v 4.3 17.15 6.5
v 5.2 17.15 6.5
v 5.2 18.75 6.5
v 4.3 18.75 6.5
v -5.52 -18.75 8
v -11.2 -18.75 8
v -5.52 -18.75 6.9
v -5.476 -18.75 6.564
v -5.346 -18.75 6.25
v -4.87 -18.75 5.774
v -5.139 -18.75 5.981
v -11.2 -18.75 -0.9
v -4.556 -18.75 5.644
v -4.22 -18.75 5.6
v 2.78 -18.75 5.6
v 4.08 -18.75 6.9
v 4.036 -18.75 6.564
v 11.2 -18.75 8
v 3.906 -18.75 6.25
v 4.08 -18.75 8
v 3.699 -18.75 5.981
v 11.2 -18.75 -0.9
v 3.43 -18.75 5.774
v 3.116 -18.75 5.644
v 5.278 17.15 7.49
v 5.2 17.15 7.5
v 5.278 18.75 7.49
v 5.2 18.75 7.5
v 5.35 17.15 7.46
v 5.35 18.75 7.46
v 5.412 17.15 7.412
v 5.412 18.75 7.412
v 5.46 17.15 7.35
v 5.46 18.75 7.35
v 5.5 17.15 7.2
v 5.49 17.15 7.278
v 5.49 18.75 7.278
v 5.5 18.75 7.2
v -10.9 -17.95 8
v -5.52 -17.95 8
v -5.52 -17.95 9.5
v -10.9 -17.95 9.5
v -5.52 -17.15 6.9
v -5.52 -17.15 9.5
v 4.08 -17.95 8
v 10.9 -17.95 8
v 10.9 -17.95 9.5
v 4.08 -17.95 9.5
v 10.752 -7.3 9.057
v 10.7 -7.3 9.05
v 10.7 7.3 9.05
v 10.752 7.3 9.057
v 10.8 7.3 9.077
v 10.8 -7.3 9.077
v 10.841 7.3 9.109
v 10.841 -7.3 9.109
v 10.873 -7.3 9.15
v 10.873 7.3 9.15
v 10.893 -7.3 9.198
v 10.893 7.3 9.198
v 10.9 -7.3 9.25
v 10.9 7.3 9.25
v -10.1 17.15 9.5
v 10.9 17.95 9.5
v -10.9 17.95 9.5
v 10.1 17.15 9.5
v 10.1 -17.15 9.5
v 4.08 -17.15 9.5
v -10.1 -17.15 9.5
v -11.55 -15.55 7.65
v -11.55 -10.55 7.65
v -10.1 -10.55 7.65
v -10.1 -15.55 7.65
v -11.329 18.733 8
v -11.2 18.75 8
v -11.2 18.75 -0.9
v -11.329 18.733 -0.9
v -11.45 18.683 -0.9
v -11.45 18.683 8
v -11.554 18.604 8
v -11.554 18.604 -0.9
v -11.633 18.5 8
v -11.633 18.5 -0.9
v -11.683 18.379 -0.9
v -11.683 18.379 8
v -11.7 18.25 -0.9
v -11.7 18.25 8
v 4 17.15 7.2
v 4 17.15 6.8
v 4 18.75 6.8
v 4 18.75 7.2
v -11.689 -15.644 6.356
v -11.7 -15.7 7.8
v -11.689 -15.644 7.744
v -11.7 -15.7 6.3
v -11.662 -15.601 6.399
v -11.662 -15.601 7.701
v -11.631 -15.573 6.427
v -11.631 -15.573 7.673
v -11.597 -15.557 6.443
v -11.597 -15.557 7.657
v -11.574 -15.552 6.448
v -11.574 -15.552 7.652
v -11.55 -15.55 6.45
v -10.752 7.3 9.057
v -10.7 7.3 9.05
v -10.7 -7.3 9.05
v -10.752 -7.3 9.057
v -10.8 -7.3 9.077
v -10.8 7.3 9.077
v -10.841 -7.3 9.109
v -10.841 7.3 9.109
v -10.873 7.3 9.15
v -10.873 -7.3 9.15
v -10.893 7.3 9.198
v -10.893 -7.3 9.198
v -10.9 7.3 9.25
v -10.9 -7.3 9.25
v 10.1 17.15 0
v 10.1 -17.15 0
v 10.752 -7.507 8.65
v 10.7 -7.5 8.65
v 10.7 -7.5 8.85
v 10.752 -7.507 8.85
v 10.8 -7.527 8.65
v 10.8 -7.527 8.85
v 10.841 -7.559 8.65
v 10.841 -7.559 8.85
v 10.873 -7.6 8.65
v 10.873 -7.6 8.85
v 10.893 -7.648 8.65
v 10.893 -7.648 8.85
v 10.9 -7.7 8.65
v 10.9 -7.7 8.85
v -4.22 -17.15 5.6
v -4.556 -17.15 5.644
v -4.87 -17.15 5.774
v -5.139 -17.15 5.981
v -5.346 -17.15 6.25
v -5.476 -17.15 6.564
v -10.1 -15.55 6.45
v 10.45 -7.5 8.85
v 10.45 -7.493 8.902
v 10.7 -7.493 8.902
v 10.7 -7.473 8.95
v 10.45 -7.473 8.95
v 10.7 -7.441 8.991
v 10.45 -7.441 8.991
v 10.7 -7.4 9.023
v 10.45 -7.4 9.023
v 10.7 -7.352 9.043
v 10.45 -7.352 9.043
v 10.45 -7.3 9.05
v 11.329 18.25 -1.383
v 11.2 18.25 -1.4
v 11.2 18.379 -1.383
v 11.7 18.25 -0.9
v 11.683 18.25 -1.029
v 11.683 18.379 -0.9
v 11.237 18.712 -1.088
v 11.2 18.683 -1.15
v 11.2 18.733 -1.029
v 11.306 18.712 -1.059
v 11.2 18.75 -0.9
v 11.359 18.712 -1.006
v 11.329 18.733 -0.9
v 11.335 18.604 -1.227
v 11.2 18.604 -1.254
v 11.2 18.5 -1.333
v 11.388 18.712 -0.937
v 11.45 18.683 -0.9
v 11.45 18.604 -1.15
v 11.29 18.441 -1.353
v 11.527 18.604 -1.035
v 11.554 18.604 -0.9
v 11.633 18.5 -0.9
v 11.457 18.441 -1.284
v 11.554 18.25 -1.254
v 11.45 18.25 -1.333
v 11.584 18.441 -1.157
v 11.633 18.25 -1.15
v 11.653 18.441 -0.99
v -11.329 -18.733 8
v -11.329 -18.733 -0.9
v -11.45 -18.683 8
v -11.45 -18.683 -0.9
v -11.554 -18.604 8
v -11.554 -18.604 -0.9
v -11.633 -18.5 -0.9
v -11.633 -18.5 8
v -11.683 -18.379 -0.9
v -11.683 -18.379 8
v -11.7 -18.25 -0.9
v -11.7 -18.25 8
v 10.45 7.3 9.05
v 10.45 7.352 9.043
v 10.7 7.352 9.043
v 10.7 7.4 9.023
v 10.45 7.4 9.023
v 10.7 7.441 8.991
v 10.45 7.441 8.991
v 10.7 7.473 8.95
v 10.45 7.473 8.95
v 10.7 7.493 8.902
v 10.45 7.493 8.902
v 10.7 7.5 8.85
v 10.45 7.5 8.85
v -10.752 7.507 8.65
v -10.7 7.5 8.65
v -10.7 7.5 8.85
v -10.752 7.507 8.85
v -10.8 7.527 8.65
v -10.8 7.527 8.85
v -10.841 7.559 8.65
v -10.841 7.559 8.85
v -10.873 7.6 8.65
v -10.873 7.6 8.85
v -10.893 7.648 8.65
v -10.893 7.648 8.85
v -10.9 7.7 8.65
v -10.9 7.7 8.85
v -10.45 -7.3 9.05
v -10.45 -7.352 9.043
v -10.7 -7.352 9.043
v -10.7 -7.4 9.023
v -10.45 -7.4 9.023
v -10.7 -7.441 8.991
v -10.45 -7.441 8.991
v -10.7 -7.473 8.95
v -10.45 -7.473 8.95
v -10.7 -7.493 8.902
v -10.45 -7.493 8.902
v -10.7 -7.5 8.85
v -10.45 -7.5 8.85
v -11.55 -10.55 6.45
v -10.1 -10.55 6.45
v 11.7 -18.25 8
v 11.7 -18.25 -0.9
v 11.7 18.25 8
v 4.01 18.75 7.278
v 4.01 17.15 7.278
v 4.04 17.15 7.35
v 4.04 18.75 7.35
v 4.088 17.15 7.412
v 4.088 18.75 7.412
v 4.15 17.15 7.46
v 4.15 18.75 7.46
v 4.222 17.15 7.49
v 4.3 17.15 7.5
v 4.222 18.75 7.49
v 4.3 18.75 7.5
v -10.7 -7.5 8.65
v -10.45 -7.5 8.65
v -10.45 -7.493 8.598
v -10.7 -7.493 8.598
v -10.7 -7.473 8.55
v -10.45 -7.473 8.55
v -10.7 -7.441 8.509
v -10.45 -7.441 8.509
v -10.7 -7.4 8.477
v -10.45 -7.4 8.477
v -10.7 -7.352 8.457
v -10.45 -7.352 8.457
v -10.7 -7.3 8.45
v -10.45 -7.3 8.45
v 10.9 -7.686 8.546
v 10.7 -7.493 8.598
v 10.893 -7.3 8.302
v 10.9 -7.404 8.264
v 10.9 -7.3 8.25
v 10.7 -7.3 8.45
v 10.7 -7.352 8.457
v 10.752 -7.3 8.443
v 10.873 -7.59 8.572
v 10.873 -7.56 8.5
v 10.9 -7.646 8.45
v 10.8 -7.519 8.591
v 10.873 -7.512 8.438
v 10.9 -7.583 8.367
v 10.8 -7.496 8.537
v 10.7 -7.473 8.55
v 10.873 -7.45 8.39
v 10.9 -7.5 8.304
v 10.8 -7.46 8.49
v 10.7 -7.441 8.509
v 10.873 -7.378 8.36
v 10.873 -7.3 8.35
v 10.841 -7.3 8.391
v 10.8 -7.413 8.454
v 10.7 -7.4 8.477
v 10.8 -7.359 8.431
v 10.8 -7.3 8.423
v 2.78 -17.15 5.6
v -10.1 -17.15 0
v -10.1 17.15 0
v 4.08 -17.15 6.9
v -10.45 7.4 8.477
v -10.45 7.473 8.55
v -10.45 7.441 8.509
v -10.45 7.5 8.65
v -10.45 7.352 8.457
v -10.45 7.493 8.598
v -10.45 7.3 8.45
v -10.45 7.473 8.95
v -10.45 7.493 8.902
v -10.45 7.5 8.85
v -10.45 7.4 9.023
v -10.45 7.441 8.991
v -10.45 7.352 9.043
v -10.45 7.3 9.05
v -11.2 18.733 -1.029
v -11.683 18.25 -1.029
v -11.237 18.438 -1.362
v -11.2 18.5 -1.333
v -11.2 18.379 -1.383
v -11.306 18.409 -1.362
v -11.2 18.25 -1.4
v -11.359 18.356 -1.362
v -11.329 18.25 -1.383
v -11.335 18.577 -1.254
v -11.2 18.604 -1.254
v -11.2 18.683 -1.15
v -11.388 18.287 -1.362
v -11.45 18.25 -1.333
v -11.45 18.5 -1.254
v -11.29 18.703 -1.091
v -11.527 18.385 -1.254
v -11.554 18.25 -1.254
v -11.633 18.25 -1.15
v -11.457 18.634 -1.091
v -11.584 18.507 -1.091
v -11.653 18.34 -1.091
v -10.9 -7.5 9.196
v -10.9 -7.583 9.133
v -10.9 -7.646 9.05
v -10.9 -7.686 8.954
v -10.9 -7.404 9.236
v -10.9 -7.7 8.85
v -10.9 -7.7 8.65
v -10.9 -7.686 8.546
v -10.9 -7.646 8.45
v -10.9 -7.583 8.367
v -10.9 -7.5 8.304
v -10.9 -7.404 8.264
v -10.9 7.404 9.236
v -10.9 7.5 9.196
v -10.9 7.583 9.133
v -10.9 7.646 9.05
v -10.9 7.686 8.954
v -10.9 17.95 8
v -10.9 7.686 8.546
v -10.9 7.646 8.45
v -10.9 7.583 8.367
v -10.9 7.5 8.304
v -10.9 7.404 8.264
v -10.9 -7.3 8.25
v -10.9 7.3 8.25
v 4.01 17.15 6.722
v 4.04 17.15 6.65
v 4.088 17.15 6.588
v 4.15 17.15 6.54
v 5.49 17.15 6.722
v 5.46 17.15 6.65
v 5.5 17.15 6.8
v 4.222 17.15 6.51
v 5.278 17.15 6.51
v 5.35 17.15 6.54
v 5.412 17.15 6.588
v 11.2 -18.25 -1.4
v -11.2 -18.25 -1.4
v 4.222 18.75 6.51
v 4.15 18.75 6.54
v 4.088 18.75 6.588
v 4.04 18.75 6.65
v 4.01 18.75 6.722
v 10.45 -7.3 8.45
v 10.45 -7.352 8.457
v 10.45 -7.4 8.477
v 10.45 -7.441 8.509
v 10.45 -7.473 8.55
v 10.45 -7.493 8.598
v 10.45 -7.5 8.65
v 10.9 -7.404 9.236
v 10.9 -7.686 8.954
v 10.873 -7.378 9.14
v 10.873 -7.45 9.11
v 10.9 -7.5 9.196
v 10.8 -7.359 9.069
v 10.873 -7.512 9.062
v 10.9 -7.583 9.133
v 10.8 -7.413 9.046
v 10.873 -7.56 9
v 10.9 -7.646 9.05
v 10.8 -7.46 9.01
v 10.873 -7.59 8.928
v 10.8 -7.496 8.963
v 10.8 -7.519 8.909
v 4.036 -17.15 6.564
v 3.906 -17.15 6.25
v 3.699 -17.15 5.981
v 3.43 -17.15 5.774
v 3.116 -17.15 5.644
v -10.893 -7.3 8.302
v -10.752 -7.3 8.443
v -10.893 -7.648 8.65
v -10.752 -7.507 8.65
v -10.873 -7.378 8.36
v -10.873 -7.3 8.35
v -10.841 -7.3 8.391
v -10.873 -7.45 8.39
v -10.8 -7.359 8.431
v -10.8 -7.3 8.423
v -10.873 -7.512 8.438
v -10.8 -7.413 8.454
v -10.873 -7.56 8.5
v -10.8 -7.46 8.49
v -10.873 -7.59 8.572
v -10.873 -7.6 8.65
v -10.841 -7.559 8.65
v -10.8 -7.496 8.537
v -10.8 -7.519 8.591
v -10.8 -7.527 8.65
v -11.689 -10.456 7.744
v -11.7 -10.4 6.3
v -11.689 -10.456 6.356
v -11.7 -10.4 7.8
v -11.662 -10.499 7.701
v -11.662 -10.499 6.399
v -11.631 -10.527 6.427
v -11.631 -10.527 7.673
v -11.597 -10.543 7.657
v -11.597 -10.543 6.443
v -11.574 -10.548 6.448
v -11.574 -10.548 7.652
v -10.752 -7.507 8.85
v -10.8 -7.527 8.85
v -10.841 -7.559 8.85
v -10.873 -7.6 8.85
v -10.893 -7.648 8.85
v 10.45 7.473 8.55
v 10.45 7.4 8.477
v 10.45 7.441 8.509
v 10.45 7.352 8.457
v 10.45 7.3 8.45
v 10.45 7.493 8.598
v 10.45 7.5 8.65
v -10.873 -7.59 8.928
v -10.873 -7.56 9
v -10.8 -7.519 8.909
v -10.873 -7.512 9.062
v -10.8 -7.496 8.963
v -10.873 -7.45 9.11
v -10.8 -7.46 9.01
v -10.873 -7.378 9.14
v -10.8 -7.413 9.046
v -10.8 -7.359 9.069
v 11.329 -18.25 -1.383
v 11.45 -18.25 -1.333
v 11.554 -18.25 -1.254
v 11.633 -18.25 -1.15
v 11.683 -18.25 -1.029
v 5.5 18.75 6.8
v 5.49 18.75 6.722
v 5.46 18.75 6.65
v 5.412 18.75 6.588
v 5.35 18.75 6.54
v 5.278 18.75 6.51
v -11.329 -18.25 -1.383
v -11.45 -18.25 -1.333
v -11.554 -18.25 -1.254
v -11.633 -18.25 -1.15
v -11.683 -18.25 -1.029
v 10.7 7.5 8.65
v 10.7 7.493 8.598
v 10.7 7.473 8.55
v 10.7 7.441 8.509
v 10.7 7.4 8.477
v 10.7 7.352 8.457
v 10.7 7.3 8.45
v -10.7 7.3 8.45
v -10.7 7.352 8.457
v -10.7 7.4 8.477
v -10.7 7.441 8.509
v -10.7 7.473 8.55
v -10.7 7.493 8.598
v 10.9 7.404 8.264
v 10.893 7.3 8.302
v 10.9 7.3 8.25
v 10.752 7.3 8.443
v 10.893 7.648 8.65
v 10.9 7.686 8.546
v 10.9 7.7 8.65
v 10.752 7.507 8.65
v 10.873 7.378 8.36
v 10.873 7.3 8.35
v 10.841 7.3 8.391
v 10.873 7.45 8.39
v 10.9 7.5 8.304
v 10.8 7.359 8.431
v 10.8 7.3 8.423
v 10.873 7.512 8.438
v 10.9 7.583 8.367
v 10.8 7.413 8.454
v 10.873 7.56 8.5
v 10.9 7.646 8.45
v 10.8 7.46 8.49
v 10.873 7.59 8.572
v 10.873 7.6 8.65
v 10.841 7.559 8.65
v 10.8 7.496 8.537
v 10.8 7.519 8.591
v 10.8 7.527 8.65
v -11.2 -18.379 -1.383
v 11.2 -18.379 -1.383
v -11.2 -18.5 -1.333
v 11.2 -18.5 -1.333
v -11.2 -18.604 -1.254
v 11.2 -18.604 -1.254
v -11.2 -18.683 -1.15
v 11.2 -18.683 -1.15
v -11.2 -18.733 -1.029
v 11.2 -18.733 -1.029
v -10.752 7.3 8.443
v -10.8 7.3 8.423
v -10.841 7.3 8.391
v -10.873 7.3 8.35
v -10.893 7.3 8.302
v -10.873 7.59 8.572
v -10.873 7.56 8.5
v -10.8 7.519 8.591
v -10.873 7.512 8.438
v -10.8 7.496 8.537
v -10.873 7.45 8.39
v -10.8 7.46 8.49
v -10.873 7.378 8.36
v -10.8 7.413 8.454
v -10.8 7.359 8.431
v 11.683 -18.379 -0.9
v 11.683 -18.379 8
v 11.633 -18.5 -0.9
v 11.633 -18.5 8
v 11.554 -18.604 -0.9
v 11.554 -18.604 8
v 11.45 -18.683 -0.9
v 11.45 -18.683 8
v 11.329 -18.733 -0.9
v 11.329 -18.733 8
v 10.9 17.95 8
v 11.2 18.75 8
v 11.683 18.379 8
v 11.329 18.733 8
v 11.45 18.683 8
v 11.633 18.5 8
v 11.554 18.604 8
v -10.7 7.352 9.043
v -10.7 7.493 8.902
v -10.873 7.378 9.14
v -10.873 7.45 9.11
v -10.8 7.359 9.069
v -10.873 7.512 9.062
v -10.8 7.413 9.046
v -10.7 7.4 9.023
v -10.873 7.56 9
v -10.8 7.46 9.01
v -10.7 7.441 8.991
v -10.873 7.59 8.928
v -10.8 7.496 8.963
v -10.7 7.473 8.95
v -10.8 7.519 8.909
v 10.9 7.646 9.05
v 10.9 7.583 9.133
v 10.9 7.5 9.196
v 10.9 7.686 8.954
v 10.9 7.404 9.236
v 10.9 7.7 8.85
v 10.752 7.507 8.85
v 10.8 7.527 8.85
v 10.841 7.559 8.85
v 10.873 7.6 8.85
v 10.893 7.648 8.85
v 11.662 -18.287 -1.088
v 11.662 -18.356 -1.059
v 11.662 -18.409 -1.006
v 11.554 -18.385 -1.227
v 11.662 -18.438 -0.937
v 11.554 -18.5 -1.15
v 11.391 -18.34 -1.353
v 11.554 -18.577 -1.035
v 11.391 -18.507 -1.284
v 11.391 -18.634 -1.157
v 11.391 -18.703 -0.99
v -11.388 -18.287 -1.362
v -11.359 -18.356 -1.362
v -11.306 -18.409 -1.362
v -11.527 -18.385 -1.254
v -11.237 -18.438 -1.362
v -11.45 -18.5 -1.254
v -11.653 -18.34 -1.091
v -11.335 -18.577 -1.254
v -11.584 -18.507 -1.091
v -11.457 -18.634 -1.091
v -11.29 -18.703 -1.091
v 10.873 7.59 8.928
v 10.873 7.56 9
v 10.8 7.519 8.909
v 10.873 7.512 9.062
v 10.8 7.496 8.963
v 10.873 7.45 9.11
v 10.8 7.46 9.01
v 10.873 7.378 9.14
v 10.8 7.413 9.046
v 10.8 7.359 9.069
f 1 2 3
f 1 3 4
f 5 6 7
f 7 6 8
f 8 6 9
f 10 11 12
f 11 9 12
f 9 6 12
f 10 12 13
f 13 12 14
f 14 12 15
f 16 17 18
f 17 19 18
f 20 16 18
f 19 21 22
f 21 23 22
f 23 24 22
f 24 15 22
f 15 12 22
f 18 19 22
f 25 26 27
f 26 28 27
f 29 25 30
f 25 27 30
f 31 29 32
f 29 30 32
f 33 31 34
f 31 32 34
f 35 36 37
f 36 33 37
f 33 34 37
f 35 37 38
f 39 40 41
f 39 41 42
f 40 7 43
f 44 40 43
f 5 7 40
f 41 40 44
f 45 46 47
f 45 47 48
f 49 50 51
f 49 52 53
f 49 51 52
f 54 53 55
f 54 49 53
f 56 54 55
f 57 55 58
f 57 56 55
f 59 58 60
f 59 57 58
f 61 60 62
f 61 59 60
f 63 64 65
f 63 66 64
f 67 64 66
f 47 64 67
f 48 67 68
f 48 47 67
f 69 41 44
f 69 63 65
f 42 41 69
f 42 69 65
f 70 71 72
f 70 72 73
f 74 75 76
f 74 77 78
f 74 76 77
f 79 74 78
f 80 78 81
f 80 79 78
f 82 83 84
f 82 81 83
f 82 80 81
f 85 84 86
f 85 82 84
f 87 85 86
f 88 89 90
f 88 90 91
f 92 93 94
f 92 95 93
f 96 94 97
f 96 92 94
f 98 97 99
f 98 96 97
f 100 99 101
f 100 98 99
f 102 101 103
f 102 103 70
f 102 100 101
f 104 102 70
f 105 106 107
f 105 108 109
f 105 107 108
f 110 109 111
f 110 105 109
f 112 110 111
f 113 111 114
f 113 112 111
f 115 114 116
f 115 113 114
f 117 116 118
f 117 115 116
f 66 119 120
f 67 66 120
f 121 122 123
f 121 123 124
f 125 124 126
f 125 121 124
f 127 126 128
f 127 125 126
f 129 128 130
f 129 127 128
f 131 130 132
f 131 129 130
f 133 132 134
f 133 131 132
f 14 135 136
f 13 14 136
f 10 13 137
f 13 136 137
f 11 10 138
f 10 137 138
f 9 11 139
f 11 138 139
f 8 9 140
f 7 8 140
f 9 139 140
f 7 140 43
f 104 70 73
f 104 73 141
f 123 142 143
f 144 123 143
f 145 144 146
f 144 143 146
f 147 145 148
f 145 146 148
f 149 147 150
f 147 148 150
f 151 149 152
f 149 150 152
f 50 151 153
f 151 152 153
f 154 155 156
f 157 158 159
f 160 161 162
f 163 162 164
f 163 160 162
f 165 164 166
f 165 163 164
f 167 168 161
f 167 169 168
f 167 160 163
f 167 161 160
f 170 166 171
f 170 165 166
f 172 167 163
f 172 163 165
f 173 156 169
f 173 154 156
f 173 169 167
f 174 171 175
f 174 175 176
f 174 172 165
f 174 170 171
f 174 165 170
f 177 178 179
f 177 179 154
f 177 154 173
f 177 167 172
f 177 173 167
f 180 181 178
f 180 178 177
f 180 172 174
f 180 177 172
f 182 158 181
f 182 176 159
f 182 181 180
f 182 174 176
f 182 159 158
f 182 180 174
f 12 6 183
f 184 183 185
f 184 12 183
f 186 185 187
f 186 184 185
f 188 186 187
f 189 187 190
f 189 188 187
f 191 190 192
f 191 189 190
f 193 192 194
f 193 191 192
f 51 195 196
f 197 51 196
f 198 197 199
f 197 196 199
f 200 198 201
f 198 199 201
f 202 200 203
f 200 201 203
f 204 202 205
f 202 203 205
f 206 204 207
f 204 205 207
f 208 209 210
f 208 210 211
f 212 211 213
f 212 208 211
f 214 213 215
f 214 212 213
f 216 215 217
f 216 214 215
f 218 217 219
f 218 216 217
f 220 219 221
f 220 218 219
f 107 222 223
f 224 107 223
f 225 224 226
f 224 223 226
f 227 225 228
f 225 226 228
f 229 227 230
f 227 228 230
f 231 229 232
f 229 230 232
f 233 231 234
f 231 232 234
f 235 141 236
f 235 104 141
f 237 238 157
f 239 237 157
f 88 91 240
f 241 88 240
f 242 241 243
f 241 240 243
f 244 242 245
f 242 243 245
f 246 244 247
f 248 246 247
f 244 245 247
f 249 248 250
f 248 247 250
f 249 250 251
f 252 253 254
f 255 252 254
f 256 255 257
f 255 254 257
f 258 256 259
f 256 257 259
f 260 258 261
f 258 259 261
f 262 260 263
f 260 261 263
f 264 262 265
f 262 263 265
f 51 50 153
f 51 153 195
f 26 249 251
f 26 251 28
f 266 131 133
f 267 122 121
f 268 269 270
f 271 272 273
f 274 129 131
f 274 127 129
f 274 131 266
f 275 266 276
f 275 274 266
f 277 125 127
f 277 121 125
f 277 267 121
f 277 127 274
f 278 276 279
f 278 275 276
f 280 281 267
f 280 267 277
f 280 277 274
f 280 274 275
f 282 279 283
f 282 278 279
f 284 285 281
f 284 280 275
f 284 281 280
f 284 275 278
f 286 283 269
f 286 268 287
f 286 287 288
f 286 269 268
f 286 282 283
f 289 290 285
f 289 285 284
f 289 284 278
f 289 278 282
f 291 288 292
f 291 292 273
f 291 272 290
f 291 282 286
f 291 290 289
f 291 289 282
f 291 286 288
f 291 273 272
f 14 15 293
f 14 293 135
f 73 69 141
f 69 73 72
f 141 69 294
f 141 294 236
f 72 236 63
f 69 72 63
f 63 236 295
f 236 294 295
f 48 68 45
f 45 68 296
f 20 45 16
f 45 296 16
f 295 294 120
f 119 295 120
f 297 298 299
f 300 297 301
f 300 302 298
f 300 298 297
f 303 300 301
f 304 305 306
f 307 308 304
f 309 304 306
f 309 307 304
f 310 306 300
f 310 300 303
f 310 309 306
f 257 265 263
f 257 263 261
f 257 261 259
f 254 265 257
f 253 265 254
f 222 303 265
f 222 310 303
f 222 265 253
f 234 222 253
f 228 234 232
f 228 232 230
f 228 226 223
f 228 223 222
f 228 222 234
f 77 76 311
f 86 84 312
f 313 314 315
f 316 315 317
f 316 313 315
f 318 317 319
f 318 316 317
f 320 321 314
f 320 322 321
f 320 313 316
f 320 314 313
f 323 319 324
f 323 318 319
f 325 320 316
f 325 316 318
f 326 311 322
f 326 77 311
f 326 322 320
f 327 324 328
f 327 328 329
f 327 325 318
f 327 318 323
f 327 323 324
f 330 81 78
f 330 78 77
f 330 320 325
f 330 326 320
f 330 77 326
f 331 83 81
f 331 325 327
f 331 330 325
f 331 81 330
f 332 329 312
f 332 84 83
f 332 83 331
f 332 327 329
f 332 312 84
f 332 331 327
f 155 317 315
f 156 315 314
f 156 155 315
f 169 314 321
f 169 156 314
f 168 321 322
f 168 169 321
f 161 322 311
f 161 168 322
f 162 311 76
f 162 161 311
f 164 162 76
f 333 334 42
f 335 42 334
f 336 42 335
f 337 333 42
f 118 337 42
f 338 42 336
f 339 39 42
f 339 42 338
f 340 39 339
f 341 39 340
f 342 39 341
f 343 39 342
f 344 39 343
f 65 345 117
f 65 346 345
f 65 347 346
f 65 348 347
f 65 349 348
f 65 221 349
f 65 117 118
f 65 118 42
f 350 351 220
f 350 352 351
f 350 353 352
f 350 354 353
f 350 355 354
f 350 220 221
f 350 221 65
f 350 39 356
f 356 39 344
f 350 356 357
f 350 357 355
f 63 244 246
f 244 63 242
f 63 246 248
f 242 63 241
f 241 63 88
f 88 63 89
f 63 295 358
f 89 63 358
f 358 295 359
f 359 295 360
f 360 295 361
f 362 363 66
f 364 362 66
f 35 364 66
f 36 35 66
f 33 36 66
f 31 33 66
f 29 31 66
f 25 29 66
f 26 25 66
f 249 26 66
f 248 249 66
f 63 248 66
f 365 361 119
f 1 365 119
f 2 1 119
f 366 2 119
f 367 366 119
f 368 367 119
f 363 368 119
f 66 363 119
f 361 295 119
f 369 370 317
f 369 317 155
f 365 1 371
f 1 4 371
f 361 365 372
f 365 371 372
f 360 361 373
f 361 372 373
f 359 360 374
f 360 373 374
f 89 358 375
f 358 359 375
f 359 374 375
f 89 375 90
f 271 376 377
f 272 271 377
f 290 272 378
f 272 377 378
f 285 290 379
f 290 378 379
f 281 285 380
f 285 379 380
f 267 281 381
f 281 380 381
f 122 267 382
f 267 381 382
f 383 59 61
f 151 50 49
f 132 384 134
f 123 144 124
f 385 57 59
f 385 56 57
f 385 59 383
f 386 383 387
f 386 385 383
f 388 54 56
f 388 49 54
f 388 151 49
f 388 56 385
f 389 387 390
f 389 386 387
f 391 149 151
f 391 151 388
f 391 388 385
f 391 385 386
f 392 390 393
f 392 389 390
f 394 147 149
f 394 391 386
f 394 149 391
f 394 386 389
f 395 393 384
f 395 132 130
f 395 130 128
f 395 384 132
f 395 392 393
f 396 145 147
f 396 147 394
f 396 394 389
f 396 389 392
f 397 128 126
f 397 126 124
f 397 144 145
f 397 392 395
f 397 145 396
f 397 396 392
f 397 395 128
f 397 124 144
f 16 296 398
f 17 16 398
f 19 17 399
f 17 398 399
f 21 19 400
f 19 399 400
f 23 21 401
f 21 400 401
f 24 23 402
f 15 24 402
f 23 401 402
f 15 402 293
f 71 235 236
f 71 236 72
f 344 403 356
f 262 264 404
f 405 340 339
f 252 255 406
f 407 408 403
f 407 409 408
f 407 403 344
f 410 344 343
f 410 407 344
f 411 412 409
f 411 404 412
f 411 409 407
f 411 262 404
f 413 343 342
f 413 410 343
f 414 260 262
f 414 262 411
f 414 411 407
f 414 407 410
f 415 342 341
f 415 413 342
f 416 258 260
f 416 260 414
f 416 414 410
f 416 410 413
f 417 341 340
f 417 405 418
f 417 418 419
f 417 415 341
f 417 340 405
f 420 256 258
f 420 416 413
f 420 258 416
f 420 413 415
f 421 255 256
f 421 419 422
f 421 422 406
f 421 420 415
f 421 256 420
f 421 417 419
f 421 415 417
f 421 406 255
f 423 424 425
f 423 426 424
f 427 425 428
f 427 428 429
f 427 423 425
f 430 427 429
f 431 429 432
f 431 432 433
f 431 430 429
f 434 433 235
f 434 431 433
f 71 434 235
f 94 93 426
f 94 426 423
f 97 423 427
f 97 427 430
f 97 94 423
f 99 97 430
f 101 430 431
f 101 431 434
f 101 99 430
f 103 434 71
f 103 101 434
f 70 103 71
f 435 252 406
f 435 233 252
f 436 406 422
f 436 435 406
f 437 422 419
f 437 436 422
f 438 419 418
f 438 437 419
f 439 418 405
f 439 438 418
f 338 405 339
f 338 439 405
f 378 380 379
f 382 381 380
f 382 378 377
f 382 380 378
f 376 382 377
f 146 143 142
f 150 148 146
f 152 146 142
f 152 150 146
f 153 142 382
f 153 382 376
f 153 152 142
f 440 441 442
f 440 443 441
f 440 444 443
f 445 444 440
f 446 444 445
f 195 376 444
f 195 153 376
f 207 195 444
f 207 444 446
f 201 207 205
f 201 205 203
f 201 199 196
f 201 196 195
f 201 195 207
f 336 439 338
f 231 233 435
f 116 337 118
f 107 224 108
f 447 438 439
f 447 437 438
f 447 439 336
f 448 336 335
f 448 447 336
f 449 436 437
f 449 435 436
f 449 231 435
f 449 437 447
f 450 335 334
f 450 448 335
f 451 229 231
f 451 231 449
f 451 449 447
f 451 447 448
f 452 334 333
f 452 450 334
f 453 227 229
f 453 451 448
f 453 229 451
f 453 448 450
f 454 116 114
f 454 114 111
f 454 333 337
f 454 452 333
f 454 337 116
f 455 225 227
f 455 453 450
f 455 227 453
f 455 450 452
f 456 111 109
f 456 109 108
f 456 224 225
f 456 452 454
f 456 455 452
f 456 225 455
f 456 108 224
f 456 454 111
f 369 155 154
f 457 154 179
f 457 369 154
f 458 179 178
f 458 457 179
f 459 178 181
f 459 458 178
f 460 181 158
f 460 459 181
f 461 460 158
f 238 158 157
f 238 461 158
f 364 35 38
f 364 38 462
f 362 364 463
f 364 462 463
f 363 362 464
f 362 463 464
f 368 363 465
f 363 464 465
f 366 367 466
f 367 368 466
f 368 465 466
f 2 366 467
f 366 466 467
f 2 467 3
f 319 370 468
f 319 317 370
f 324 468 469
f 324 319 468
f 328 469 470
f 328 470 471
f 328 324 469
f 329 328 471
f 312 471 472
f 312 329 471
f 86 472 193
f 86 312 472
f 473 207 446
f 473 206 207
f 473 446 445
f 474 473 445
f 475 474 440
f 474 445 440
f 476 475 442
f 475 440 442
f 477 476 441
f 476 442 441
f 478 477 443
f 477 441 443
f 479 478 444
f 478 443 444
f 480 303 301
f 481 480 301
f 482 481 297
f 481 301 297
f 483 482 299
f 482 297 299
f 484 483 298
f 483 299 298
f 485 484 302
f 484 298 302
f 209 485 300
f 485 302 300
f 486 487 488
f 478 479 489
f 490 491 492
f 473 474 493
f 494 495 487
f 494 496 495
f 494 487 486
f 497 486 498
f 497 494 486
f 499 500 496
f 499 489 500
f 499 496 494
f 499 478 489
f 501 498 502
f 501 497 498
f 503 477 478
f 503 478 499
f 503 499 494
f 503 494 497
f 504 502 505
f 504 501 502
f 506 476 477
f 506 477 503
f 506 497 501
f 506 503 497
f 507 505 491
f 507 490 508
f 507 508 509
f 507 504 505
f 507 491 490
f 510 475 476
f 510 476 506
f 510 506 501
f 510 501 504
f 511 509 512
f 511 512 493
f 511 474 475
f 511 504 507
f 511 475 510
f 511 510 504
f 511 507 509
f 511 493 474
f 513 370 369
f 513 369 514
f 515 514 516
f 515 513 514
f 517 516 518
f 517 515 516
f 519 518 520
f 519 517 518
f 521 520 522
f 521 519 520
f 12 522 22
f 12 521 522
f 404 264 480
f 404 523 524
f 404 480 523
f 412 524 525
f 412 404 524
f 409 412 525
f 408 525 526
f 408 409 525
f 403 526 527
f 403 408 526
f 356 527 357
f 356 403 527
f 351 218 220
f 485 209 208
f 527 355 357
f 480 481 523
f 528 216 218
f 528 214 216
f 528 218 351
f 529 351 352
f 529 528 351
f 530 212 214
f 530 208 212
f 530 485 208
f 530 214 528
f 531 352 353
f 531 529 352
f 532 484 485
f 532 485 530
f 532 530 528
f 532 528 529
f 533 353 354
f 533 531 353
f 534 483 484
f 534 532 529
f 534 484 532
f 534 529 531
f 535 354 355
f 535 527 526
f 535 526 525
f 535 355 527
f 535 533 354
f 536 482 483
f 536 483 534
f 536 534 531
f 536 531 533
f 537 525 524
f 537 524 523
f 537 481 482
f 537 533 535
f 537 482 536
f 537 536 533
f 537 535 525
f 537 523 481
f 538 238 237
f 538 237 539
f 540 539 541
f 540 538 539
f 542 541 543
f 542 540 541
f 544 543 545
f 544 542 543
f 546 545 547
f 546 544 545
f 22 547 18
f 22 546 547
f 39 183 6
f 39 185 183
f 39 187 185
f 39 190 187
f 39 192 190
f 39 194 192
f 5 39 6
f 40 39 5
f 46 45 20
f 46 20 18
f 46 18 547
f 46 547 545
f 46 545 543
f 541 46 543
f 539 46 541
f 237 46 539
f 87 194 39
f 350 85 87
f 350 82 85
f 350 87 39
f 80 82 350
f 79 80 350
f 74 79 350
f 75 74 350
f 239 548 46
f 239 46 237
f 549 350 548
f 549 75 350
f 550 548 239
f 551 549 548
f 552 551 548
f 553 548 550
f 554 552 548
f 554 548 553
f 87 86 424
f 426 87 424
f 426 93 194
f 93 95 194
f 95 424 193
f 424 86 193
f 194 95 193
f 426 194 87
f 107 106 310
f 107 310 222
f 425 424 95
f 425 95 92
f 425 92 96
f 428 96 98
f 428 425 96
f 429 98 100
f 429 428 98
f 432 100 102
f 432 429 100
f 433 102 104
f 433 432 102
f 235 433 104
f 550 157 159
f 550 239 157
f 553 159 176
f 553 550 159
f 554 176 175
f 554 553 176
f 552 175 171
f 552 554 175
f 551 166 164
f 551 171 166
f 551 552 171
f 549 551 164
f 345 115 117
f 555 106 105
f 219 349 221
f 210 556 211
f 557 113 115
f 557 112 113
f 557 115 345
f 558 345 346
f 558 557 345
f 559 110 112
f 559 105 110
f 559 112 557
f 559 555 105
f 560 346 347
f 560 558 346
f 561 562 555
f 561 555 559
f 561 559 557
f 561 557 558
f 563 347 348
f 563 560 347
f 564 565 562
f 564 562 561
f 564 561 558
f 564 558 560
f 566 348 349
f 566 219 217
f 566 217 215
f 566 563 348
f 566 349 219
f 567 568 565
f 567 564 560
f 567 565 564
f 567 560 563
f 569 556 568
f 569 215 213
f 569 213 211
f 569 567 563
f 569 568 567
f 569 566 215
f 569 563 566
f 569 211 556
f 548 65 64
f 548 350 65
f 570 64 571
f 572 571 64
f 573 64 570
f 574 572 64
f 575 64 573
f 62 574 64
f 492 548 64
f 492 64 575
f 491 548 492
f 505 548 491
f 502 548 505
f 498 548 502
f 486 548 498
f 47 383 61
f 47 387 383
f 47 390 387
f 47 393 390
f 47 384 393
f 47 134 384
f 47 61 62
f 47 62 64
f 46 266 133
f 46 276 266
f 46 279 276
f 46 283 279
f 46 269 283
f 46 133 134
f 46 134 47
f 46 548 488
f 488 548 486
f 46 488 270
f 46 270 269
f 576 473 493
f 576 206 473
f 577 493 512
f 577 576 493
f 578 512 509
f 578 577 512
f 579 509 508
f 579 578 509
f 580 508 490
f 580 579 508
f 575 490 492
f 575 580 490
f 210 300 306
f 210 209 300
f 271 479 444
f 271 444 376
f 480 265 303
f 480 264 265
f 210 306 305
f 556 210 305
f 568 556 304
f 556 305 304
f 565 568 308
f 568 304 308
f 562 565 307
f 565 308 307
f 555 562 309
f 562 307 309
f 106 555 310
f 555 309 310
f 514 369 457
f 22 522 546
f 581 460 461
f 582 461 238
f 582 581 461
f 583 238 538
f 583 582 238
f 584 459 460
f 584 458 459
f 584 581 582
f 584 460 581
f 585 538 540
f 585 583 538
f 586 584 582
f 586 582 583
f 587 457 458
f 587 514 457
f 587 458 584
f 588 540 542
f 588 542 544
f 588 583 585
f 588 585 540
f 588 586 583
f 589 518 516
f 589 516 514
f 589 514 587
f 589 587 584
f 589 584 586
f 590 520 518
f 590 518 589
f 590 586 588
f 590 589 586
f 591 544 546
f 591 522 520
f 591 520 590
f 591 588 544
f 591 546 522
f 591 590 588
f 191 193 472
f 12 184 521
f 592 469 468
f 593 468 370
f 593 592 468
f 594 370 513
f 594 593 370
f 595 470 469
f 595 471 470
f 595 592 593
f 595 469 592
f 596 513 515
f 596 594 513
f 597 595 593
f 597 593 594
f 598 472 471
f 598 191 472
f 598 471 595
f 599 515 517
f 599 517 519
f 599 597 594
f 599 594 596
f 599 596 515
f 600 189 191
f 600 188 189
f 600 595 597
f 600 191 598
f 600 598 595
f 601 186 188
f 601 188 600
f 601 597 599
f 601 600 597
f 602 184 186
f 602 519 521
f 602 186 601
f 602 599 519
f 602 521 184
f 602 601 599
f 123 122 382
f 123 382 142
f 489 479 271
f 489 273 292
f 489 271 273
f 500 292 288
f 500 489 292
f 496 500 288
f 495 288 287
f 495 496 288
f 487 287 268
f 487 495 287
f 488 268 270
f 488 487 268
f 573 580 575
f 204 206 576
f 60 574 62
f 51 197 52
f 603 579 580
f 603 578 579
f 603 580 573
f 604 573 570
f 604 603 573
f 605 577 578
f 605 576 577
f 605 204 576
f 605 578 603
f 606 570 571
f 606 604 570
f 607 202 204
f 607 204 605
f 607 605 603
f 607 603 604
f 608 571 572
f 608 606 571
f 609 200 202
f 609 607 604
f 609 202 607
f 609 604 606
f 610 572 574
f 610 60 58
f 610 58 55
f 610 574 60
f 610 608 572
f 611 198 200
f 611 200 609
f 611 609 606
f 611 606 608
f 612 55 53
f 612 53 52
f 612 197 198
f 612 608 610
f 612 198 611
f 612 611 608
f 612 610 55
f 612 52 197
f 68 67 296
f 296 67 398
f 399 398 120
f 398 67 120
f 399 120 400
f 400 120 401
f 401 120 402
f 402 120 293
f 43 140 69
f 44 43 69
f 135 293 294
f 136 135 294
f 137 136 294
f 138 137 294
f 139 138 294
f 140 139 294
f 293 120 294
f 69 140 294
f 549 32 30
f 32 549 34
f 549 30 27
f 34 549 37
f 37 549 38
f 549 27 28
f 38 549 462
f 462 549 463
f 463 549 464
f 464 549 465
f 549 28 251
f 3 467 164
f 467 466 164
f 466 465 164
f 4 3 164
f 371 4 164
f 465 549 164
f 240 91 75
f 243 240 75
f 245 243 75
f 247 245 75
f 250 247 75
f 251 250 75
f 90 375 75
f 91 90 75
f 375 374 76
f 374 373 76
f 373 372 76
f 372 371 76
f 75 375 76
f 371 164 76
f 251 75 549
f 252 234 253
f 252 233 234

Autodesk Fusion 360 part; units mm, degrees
sketch "Sketch1" plane through (0, 0, 0) normal (0, 0, 1) x (1, 0, 0)
  line L0 (10.1, -17.15) -> (-10.1, -17.15)
  line L1 (-10.1, -17.15) -> (-10.1, 17.15)
  line L2 (-10.1, 17.15) -> (10.1, 17.15)
  line L3 (10.1, 17.15) -> (10.1, -17.15)
  line L4 (10.1, -17.15) -> (-10.1, 17.15) construction
  line L5 (-10.1, -17.15) -> (10.1, 17.15) construction
  line L6 (11.7, 18.75) -> (-11.7, 18.75)
  line L7 (-11.7, 18.75) -> (-11.7, -18.75)
  line L8 (-11.7, -18.75) -> (11.7, -18.75)
  line L9 (11.7, -18.75) -> (11.7, 18.75)
  line L10 (11.7, 18.75) -> (-11.7, -18.75) construction
  line L11 (-11.7, 18.75) -> (11.7, -18.75) construction
  dimension "d1" = 20.2
  dimension "d2" = 34.3
  dimension "d4" = 1.6
  dimension "d5" = 1.6
extrude "Extrude1" add sketch "Sketch1" along normal blind 8
sketch "Sketch2" plane through (0, 0, 0) normal (0, 0, -1) x (1, 0, 0)
  line L0 (10.1, -17.15) -> (-10.1, -17.15)
  line L1 (-10.1, -17.15) -> (-10.1, 17.15)
  line L2 (-10.1, 17.15) -> (10.1, 17.15)
  line L3 (10.1, 17.15) -> (10.1, -17.15)
  line L4 (11.7, -18.75) -> (11.7, 18.75)
  line L5 (11.7, 18.75) -> (-11.7, 18.75)
  line L6 (-11.7, 18.75) -> (-11.7, -18.75)
  line L7 (-11.7, -18.75) -> (11.7, -18.75)
  line L8 (-11.7, 18.75) -> (11.7, 18.75)
  line L9 (11.7, 18.75) -> (11.7, -18.75)
  line L10 (11.7, -18.75) -> (-11.7, -18.75)
  line L11 (-11.7, -18.75) -> (-11.7, 18.75)
extrude "Extrude2" add sketch "Sketch2" along normal blind 1.4 contours L0 L1 L2 L3 | L4 L5 L6 L7 L8 L9 L10 L11
sketch "Sketch3" plane through (0, -18.75, 0) normal (0, -1, 0) x (1, 0, 0)
  line L0 (11.7, -1.4) -> (11.7, 8)
  line L1 (11.7, 8) -> (-11.7, 8)
  line L2 (-11.7, 8) -> (-11.7, -1.4)
  line L3 (-11.7, -1.4) -> (11.7, -1.4)
  line L4 (-5.52, 8) -> (4.08, 8)
  line L5 (4.08, 8) -> (4.08, 5.6)
  line L6 (4.08, 5.6) -> (-5.52, 5.6)
  line L7 (-5.52, 5.6) -> (-5.52, 8)
  dimension "d10" = 7
  dimension "d11" = 6.18
  dimension "d14" = 9.6
extrude "Extrude3" cut sketch "Sketch3" against normal up to surface (1.6 mm away) contours L1 L4 L5 L6 L7
fillet "Fillet1" radius 1.3 2 edges at (-5.52, -17.95, 5.6) (4.08, -17.95, 5.6)
sketch "Sketch4" plane through (-11.7, 0, 0) normal (-1, 0, 0) x (0, -1, 0)
  line L0 (18.75, -1.4) -> (18.75, 8)
  line L1 (18.75, 8) -> (-18.75, 8)
  line L2 (-18.75, 8) -> (-18.75, -1.4)
  line L3 (-18.75, -1.4) -> (18.75, -1.4)
  line L4 (10.55, 7.65) -> (15.55, 7.65)
  line L5 (15.55, 7.65) -> (15.55, 6.45)
  line L6 (15.55, 6.45) -> (10.55, 6.45)
  line L7 (10.55, 6.45) -> (10.55, 7.65)
  dimension "d17" = 3.2
  dimension "d18" = 5
  dimension "d19" = 1.2
  dimension "d22" = 0.35
extrude "Extrude4" cut sketch "Sketch4" against normal up to surface (1.6 mm away) contours L4 L5 L6 L7
fillet "Fillet2" radius 0.15 4 edges at (-11.7, -13.05, 6.45) (-11.7, -10.55, 7.05) (-11.7, -13.05, 7.65) (-11.7, -15.55, 7.05)
sketch "Sketch5" plane through (0, 0, 8) normal (0, 0, 1) x (-1, 0, 0)
  line L0 (-4.08, 17.15) -> (-4.08, 18.75)
  line L1 (-4.08, 18.75) -> (-11.7, 18.75)
  line L2 (-11.7, 18.75) -> (-11.7, -18.75)
  line L3 (-11.7, -18.75) -> (11.7, -18.75)
  line L4 (11.7, -18.75) -> (11.7, 18.75)
  line L5 (11.7, 18.75) -> (5.52, 18.75)
  line L6 (5.52, 18.75) -> (5.52, 17.15)
  line L7 (5.52, 17.15) -> (10.1, 17.15)
  line L8 (10.1, 17.15) -> (10.1, -17.15)
  line L9 (10.1, -17.15) -> (-10.1, -17.15)
  line L10 (-10.1, -17.15) -> (-10.1, 17.15)
  line L11 (-10.1, 17.15) -> (-4.08, 17.15)
  line L12 (10.9, -17.95) -> (-10.9, -17.95)
  line L13 (-10.9, -17.95) -> (-10.9, 17.95)
  line L14 (-10.9, 17.95) -> (10.9, 17.95)
  line L15 (10.9, 17.95) -> (10.9, -17.95)
  dimension "d26" = 0.8
  dimension "d27" = 0.8
  dimension "d28" = 0.8
  dimension "d29" = 0.8
extrude "Extrude5" add sketch "Sketch5" along normal blind 1.5 contours L0 L6 L7 L8 L9 L10 L11 L12 L13 L14 L15
sketch "Sketch7" plane through (10.9, 0, 0) normal (1, 0, 0) x (0, 1, 0)
  line L0 (-17.95, 8) -> (17.95, 8)
  line L1 (17.95, 8) -> (17.95, 9.5)
  line L2 (17.95, 9.5) -> (-17.95, 9.5)
  line L3 (-17.95, 9.5) -> (-17.95, 8)
  line L4 (-17.95, 9.5) -> (17.95, 8) construction
  line L5 (17.95, 9.5) -> (-17.95, 8) construction
  line L6 (0, 8.75) -> (-14.5, 8.75) construction
  line L7 (7.5, 8.45) -> (-7.5, 8.45)
  line L8 (-7.5, 8.45) -> (-7.5, 9.05)
  line L9 (-7.5, 9.05) -> (7.5, 9.05)
  line L10 (7.5, 9.05) -> (7.5, 8.45)
  line L11 (7.5, 8.45) -> (-7.5, 9.05) construction
  line L12 (-7.5, 8.45) -> (7.5, 9.05) construction
  point P0 (0, 8.75)
  dimension "d32" = 15
  dimension "d33" = 0.6
ref_plane "WorkPlane1" through (0, 0, 8.75) normal (1, 0, 0) x (0, 1, 0)
extrude "Extrude6" cut sketch "Sketch7" against normal blind 0.45 contours L7 L8 L9 L10
fillet "Fillet5" radius 0.2 4 edges at (10.675, -7.5, 8.45) (10.675, -7.5, 9.05) (10.675, 7.5, 8.45) (10.675, 7.5, 9.05)
fillet "Fillet6" radius 0.2 8 edges at (10.9, -7.4414, 8.5086) (10.9, 0, 8.45) (10.9, 7.4414, 8.5086) (10.9, 7.5, 8.75) (10.9, 7.4414, 8.9914) (10.9, 0, 9.05) (10.9, -7.4414, 8.9914) (10.9, -7.5, 8.75)
mirror "Mirror2" about plane through (0, 0, 8.75) normal (1, 0, 0) of "Extrude6"
fillet "Fillet7" radius 0.2 4 edges at (-10.675, 7.5, 8.45) (-10.675, 7.5, 9.05) (-10.675, -7.5, 8.45) (-10.675, -7.5, 9.05)
fillet "Fillet8" radius 0.2 8 edges at (-10.9, -7.4414, 8.9914) (-10.9, -7.5, 8.75) (-10.9, -7.4414, 8.5086) (-10.9, 0, 8.45) (-10.9, 7.4414, 8.5086) (-10.9, 7.5, 8.75) (-10.9, 7.4414, 8.9914) (-10.9, 0, 9.05)
fillet "Fillet9" radius 0.5 8 edges at (-11.7, 18.75, 3.3) (-11.7, -18.75, 3.3) (-11.7, 0, -1.4) (0, -18.75, -1.4) (11.7, -18.75, 3.3) (11.7, 0, -1.4) (11.7, 18.75, 3.3) (0, 18.75, -1.4)
sketch "Sketch8" plane through (0, 17.15, 0) normal (0, -1, 0) x (1, 0, 0)
  line L0 (-10.1, 0) -> (10.1, 0)
  line L1 (10.1, 0) -> (10.1, 9.5)
  line L2 (10.1, 9.5) -> (-10.1, 9.5)
  line L3 (-10.1, 9.5) -> (-10.1, 0)
  line L4 (4, 7.5) -> (5.5, 7.5)
  line L5 (5.5, 7.5) -> (5.5, 6.5)
  line L6 (5.5, 6.5) -> (4, 6.5)
  line L7 (4, 6.5) -> (4, 7.5)
  dimension "d55" = 4.6
  dimension "d56" = 1
  dimension "d57" = 1.5
  dimension "d58" = 2
extrude "Extrude7" cut sketch "Sketch8" against normal up to surface (1.6 mm away) contours L4 L5 L6 L7
fillet "Fillet10" radius 0.3 4 edges at (5.5, 17.95, 6.5) (5.5, 17.95, 7.5) (4, 17.95, 7.5) (4, 17.95, 6.5)
equation "case_thickness = 1.6 mm"
equation "d4 = case_thickness"
equation "d5 = case_thickness"
equation "d8 = case_thickness - 0.2 mm"
equation "d11 = 4.58 mm + case_thickness"
equation "lock_rim = 0.8 mm"
equation "d26 = lock_rim"
equation "d27 = lock_rim"
equation "d28 = lock_rim"
equation "d29 = lock_rim"
equation "d43 = clip_roundness"
equation "d45 = clip_roundness"
equation "clip_roundness = 0.2 mm"
equation "d50 = clip_roundness"
equation "d52 = clip_roundness"
